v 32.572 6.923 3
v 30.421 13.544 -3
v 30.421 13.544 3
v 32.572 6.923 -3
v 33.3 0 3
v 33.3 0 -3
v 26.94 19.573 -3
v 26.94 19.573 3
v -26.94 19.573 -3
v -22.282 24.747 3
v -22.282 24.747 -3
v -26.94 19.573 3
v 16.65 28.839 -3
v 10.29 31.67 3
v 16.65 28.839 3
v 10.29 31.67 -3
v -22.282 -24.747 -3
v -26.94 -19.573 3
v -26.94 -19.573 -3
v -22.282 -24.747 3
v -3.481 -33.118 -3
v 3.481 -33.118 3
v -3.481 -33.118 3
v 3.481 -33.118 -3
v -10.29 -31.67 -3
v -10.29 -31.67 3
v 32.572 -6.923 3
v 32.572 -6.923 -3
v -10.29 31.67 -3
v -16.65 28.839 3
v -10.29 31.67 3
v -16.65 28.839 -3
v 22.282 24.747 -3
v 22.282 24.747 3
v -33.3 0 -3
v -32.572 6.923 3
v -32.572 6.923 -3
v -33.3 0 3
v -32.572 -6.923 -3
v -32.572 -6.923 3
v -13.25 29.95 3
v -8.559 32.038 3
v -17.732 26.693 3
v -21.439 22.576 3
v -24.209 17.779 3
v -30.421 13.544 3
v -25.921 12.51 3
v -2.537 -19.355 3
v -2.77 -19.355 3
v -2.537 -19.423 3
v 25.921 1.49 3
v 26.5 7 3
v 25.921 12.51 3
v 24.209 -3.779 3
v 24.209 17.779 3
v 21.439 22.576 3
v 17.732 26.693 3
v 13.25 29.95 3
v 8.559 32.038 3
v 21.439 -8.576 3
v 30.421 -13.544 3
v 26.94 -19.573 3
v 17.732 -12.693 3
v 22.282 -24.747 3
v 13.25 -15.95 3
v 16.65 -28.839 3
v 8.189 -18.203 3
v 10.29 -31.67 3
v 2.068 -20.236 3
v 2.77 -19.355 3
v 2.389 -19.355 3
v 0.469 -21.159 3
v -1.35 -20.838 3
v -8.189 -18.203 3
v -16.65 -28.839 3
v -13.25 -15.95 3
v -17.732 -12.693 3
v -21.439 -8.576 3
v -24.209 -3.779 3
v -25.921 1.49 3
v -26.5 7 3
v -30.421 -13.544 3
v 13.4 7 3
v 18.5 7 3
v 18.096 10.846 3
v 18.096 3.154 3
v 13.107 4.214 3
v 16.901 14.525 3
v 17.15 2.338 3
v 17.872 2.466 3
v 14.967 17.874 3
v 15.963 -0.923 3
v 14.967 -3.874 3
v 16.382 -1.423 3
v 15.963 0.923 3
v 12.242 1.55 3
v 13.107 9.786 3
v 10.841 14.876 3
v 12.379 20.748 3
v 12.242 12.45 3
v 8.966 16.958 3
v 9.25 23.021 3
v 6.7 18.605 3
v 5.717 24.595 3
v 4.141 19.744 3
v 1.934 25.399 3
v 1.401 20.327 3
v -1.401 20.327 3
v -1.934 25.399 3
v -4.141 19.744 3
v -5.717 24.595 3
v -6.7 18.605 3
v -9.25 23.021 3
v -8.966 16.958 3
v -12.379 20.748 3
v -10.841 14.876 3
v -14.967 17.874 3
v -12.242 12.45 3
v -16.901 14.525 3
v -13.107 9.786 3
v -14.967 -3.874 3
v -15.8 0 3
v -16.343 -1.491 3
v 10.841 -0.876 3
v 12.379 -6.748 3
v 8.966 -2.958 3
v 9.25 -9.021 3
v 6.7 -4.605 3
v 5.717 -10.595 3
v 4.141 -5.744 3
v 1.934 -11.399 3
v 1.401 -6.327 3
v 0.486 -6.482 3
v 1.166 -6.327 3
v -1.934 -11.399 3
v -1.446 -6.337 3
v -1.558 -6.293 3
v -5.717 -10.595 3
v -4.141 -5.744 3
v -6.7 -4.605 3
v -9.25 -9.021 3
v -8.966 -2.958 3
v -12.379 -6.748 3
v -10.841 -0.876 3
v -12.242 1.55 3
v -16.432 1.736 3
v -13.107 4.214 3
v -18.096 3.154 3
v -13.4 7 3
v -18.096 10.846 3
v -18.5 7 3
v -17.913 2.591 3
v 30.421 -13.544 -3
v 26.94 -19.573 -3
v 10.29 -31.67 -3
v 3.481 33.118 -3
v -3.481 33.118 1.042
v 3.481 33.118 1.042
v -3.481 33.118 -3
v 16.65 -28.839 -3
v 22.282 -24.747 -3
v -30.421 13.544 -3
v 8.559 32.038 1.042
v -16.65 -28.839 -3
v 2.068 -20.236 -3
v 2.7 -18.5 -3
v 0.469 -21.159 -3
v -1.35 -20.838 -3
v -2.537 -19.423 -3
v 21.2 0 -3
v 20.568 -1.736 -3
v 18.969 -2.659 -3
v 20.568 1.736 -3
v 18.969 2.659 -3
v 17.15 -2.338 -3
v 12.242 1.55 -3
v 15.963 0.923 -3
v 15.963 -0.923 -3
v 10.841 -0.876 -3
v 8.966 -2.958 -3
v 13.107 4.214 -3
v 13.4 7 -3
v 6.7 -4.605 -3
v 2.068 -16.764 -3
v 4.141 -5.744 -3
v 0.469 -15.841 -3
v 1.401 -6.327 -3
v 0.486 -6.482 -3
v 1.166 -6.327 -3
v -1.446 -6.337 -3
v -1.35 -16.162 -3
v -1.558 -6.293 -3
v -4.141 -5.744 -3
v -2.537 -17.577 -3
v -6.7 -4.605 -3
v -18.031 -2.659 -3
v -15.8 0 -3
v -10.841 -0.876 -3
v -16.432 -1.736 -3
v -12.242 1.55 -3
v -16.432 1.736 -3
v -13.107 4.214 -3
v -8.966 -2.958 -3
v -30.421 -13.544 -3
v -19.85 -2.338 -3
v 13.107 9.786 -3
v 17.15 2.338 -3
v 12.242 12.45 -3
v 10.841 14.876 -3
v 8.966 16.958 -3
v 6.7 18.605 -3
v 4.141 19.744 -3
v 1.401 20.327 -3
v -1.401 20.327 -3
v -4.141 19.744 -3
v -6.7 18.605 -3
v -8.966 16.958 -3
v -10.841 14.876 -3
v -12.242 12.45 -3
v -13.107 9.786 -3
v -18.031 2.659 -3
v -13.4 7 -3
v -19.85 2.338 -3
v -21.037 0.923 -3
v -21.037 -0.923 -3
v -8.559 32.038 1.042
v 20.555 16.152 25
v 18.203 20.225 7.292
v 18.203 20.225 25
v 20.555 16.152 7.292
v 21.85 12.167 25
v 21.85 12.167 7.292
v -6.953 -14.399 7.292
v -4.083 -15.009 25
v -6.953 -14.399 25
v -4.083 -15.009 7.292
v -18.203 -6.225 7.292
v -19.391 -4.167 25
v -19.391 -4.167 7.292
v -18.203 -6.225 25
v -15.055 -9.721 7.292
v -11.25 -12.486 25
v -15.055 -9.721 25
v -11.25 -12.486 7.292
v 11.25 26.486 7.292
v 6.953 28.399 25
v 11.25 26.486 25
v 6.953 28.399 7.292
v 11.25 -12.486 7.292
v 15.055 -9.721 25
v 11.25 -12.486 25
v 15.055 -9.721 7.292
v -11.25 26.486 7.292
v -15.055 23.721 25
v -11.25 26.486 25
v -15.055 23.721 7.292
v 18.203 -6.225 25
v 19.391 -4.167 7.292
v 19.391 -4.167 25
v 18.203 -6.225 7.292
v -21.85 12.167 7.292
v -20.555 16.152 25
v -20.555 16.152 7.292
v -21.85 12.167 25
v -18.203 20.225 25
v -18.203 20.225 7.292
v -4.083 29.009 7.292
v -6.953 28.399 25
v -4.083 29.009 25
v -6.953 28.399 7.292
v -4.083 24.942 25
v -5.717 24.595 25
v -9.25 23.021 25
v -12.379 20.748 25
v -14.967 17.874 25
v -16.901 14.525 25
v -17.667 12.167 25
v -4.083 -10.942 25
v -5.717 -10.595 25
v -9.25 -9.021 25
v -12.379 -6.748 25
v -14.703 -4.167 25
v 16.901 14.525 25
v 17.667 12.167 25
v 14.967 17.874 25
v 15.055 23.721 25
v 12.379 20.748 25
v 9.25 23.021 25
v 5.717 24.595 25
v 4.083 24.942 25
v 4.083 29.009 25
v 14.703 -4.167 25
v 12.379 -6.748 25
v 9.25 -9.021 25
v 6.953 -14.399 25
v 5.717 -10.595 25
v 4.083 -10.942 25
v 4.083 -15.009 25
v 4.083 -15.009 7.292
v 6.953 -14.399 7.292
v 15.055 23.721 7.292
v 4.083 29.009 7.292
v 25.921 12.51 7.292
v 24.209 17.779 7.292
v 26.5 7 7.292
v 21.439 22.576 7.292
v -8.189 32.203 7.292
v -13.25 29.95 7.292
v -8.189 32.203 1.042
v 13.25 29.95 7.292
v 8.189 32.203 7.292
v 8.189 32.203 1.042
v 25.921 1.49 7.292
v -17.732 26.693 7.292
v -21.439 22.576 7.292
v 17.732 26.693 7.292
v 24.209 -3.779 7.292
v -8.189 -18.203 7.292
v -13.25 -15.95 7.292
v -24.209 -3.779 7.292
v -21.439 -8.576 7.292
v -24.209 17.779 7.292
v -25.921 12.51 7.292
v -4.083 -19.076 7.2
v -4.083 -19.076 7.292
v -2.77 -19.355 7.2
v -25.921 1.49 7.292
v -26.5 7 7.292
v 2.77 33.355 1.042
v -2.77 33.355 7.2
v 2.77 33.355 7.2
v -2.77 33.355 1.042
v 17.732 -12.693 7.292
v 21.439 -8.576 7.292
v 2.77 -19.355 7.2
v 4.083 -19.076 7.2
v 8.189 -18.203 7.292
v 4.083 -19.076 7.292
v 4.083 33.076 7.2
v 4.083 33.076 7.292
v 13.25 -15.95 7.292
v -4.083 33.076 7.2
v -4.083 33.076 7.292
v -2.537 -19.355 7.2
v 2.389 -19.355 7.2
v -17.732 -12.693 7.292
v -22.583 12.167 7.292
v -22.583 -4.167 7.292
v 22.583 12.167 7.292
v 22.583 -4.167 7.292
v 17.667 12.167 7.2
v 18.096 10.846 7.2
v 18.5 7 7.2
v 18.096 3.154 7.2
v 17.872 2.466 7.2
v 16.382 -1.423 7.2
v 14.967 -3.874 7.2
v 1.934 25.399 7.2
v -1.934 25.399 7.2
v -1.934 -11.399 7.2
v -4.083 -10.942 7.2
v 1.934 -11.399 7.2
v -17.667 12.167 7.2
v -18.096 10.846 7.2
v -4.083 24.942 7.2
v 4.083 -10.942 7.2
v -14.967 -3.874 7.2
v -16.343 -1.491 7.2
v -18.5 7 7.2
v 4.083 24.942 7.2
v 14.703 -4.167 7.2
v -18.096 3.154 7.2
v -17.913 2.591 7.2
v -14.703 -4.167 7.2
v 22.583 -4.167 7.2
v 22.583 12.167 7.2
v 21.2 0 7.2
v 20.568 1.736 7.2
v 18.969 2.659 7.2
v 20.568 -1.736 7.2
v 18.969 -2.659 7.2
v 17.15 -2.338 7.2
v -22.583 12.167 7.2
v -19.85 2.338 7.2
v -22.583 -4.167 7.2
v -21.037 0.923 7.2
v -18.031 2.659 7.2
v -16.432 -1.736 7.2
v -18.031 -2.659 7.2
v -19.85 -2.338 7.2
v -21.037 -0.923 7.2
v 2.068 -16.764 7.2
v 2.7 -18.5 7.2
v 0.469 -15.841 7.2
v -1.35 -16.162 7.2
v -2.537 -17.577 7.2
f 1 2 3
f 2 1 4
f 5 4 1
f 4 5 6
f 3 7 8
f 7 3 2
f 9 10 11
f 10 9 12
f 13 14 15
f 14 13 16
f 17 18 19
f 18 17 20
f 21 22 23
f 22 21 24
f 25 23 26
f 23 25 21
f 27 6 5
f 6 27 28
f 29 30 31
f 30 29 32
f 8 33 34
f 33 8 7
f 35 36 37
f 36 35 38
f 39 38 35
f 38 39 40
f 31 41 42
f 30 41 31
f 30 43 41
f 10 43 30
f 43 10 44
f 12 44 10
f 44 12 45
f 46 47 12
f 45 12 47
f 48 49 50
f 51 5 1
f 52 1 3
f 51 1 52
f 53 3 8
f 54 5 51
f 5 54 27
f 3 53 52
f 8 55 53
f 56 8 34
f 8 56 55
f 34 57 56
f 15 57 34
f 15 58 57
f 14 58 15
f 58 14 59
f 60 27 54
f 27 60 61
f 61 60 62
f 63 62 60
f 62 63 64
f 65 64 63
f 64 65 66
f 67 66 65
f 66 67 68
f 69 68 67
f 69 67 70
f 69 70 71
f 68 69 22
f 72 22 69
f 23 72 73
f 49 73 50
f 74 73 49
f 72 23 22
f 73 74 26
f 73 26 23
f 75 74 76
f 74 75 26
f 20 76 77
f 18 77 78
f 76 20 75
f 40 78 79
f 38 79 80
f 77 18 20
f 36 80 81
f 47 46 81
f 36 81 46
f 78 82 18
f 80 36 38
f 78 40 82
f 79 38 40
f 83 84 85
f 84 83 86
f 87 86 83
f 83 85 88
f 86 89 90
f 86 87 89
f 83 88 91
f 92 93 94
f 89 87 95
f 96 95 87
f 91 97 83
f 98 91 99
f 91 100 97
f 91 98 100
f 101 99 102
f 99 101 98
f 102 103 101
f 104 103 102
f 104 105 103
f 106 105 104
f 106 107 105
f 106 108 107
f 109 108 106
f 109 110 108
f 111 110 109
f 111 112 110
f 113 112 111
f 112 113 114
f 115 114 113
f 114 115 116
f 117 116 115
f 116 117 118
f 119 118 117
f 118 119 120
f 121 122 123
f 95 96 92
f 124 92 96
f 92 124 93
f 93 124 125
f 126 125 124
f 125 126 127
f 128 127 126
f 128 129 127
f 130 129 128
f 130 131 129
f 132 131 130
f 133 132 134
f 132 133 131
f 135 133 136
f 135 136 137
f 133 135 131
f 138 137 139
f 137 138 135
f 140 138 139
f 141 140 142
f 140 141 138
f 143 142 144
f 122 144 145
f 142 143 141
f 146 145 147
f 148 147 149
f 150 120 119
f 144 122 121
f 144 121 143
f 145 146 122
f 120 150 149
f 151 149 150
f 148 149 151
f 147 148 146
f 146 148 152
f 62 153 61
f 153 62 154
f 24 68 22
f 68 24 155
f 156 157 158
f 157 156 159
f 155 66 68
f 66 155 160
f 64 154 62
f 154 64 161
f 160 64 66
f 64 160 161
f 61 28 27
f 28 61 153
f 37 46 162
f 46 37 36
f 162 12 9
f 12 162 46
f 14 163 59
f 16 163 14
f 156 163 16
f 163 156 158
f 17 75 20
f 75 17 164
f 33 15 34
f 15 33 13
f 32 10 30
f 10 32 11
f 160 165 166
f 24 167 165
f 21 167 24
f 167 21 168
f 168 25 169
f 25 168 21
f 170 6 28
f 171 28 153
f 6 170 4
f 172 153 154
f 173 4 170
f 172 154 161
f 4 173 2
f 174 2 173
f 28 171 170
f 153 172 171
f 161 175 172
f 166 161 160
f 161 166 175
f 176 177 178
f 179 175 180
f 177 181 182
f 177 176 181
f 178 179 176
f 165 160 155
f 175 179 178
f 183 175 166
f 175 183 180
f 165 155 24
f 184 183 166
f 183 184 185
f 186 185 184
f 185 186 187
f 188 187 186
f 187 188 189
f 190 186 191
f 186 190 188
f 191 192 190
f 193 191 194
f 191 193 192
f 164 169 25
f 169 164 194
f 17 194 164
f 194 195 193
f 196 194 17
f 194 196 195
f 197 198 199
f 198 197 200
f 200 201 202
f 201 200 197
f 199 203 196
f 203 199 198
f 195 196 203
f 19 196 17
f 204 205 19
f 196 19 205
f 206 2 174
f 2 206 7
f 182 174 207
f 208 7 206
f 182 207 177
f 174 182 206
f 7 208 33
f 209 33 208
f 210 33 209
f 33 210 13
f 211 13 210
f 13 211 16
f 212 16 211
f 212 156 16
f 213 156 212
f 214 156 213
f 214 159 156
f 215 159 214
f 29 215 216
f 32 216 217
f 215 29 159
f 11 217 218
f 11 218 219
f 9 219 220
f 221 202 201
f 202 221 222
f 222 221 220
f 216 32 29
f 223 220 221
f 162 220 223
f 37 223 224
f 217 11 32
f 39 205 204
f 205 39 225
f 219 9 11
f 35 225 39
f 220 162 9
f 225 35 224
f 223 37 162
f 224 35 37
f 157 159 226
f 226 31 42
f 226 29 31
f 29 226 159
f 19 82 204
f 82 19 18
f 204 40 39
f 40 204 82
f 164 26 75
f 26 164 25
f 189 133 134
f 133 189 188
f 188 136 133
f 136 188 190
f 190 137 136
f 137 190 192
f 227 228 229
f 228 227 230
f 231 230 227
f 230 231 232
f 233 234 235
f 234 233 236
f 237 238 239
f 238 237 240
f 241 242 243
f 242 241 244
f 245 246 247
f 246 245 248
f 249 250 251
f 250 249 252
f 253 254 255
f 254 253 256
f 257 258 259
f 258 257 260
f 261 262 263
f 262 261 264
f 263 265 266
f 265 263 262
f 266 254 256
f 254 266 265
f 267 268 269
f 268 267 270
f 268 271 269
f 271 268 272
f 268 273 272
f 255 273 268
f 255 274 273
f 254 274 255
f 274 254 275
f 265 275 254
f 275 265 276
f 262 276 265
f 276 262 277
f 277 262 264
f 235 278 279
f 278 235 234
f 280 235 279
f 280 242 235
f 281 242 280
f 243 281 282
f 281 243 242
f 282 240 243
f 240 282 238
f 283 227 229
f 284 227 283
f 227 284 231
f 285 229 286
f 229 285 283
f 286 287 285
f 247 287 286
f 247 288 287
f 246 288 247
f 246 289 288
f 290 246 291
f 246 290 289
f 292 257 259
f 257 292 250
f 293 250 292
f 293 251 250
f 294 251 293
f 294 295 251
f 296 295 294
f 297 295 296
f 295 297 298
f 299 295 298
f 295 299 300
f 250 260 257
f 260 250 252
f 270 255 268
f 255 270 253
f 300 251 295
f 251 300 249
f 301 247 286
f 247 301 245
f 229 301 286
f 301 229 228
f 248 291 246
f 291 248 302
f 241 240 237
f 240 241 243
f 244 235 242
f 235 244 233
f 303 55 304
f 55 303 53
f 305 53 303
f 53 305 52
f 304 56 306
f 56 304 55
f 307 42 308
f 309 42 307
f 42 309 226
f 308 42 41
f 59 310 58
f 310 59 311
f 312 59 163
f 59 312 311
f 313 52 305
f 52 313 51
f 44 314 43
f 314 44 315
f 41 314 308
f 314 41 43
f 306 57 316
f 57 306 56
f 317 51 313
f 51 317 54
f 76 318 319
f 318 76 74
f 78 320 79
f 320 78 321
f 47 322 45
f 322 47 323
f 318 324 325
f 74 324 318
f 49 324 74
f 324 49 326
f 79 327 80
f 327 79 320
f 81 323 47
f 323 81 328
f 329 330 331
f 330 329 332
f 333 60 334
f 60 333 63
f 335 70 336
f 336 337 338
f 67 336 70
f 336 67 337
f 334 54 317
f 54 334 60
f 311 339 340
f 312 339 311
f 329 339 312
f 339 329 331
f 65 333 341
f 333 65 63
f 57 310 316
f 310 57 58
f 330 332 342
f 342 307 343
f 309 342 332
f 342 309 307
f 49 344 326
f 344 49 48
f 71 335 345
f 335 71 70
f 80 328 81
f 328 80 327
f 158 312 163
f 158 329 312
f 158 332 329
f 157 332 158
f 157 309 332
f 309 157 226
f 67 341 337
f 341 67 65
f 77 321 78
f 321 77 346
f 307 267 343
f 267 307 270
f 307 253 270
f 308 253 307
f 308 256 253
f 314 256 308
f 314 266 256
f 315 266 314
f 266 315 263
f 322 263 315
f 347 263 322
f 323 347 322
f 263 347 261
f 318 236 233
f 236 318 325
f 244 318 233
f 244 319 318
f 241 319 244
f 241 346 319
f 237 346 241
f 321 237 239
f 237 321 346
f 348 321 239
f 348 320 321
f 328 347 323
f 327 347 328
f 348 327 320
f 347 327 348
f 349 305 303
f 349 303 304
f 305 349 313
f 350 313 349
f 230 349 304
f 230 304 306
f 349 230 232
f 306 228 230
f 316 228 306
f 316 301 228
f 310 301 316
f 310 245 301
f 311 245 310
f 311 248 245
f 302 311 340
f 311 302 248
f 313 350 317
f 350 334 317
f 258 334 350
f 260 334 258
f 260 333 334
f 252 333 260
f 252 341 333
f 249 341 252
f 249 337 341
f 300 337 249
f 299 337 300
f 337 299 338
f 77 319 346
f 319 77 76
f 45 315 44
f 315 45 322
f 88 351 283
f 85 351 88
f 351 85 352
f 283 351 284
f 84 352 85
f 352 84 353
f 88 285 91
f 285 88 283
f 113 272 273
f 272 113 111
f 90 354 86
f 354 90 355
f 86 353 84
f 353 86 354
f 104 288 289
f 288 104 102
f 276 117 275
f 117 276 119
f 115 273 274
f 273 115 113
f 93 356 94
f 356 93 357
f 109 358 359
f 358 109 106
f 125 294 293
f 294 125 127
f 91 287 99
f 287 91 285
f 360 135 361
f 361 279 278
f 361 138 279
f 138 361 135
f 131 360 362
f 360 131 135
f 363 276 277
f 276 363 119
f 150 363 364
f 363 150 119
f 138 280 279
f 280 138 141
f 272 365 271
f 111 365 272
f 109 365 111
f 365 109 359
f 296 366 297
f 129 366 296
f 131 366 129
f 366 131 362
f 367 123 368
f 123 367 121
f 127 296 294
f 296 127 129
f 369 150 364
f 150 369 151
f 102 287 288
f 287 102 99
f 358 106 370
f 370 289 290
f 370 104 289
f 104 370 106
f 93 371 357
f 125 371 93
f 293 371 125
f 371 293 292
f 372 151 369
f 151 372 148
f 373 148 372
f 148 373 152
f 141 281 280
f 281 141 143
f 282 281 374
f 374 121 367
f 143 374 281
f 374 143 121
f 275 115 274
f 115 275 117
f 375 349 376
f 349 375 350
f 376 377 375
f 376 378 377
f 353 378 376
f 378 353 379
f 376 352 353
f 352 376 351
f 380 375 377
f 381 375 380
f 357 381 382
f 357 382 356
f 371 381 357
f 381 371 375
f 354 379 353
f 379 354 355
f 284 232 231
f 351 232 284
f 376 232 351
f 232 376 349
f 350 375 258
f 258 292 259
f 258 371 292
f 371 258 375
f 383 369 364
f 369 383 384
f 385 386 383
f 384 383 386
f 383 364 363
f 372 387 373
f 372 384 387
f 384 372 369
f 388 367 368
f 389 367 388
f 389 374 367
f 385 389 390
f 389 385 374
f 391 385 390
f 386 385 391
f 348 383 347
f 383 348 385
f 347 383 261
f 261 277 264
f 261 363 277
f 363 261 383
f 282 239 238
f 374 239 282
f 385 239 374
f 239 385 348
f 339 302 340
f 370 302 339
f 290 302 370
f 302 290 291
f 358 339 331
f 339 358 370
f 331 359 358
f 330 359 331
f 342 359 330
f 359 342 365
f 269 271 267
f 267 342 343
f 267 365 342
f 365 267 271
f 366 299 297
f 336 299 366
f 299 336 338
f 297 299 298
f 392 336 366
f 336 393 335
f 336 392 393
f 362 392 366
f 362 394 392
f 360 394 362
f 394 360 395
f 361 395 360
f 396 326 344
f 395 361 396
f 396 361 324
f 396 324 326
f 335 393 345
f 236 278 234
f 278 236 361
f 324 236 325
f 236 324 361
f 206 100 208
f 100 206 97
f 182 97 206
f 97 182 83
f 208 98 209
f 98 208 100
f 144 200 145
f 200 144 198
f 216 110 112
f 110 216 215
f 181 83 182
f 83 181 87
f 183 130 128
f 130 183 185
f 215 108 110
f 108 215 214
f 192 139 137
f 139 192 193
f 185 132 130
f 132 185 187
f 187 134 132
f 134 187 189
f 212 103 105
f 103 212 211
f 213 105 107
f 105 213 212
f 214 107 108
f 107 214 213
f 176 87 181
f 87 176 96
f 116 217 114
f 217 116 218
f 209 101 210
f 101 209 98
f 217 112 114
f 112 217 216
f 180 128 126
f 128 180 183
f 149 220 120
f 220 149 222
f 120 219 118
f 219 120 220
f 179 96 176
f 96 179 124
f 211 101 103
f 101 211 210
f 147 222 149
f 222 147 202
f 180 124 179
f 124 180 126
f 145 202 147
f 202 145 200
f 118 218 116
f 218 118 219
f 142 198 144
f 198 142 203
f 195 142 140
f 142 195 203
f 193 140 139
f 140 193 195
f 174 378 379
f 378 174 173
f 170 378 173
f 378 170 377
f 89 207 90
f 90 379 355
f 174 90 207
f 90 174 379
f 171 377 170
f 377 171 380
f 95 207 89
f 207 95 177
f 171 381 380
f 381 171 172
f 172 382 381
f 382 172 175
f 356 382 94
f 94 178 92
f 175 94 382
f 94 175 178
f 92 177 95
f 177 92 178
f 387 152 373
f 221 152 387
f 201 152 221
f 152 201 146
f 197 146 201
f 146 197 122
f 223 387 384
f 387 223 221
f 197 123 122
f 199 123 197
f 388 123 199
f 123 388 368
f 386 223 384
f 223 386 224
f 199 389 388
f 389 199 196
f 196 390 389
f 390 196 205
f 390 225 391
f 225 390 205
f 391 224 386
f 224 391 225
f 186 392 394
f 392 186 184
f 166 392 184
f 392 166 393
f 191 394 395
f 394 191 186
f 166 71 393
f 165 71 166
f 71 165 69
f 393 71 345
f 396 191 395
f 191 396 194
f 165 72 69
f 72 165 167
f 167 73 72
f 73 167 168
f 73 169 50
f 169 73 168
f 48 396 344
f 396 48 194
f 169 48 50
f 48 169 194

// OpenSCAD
module mount(inner, length) {
side = (inner+6)/3;

	difference() {
     union() {
		cylinder(r=inner+4, h=length, center=true);
	    translate([0,0,-length/3])
		cylinder(r=inner+8, h=length/4, center=true);
      }
		cylinder(r=inner, h=length+2, center=true);

	    translate([inner,-3,6.2])  // X
			cube([side,2*side,length-2], center=true);

	    translate([-inner,-3,6.2])  // -X
			cube([side,2*side,length-2], center=true);

	    translate([0,inner,6.2])     // Y
			cube([side,2*side,length-2], center=true);

	    translate([0,-inner,6.2])  // -Y
			cube([side,2*side,length-2], center=true);

    }
}

module hole(x,y,radius) {
	translate([x,y,0])
	cylinder(r=radius,h=48,center=true);
}

module base(outer, inner, height) {
	difference() {
	  cylinder(r=outer, h=height, center=true);
	  cylinder(r=inner, h=height+2, center=true);
    }
}



// motor_radius = 18.5;
motor_radius = 18.5;
long = 25;
shaft = 6.5;
motor_offset = 7;
offset = 18.5;

difference() {
 union() {
  base(1.8*motor_radius, shaft, 6);
  translate([0,motor_offset,long/2])
	  mount(motor_radius, long);

  }
  translate([0,motor_offset,0])
	  cylinder(r=13.4,h=10,center=true);
	hole(offset,0,2.7);
	//  hole(0, offset, 1);
	hole(-offset,0,2.7);
	hole(0,-offset,2.7);
 }
